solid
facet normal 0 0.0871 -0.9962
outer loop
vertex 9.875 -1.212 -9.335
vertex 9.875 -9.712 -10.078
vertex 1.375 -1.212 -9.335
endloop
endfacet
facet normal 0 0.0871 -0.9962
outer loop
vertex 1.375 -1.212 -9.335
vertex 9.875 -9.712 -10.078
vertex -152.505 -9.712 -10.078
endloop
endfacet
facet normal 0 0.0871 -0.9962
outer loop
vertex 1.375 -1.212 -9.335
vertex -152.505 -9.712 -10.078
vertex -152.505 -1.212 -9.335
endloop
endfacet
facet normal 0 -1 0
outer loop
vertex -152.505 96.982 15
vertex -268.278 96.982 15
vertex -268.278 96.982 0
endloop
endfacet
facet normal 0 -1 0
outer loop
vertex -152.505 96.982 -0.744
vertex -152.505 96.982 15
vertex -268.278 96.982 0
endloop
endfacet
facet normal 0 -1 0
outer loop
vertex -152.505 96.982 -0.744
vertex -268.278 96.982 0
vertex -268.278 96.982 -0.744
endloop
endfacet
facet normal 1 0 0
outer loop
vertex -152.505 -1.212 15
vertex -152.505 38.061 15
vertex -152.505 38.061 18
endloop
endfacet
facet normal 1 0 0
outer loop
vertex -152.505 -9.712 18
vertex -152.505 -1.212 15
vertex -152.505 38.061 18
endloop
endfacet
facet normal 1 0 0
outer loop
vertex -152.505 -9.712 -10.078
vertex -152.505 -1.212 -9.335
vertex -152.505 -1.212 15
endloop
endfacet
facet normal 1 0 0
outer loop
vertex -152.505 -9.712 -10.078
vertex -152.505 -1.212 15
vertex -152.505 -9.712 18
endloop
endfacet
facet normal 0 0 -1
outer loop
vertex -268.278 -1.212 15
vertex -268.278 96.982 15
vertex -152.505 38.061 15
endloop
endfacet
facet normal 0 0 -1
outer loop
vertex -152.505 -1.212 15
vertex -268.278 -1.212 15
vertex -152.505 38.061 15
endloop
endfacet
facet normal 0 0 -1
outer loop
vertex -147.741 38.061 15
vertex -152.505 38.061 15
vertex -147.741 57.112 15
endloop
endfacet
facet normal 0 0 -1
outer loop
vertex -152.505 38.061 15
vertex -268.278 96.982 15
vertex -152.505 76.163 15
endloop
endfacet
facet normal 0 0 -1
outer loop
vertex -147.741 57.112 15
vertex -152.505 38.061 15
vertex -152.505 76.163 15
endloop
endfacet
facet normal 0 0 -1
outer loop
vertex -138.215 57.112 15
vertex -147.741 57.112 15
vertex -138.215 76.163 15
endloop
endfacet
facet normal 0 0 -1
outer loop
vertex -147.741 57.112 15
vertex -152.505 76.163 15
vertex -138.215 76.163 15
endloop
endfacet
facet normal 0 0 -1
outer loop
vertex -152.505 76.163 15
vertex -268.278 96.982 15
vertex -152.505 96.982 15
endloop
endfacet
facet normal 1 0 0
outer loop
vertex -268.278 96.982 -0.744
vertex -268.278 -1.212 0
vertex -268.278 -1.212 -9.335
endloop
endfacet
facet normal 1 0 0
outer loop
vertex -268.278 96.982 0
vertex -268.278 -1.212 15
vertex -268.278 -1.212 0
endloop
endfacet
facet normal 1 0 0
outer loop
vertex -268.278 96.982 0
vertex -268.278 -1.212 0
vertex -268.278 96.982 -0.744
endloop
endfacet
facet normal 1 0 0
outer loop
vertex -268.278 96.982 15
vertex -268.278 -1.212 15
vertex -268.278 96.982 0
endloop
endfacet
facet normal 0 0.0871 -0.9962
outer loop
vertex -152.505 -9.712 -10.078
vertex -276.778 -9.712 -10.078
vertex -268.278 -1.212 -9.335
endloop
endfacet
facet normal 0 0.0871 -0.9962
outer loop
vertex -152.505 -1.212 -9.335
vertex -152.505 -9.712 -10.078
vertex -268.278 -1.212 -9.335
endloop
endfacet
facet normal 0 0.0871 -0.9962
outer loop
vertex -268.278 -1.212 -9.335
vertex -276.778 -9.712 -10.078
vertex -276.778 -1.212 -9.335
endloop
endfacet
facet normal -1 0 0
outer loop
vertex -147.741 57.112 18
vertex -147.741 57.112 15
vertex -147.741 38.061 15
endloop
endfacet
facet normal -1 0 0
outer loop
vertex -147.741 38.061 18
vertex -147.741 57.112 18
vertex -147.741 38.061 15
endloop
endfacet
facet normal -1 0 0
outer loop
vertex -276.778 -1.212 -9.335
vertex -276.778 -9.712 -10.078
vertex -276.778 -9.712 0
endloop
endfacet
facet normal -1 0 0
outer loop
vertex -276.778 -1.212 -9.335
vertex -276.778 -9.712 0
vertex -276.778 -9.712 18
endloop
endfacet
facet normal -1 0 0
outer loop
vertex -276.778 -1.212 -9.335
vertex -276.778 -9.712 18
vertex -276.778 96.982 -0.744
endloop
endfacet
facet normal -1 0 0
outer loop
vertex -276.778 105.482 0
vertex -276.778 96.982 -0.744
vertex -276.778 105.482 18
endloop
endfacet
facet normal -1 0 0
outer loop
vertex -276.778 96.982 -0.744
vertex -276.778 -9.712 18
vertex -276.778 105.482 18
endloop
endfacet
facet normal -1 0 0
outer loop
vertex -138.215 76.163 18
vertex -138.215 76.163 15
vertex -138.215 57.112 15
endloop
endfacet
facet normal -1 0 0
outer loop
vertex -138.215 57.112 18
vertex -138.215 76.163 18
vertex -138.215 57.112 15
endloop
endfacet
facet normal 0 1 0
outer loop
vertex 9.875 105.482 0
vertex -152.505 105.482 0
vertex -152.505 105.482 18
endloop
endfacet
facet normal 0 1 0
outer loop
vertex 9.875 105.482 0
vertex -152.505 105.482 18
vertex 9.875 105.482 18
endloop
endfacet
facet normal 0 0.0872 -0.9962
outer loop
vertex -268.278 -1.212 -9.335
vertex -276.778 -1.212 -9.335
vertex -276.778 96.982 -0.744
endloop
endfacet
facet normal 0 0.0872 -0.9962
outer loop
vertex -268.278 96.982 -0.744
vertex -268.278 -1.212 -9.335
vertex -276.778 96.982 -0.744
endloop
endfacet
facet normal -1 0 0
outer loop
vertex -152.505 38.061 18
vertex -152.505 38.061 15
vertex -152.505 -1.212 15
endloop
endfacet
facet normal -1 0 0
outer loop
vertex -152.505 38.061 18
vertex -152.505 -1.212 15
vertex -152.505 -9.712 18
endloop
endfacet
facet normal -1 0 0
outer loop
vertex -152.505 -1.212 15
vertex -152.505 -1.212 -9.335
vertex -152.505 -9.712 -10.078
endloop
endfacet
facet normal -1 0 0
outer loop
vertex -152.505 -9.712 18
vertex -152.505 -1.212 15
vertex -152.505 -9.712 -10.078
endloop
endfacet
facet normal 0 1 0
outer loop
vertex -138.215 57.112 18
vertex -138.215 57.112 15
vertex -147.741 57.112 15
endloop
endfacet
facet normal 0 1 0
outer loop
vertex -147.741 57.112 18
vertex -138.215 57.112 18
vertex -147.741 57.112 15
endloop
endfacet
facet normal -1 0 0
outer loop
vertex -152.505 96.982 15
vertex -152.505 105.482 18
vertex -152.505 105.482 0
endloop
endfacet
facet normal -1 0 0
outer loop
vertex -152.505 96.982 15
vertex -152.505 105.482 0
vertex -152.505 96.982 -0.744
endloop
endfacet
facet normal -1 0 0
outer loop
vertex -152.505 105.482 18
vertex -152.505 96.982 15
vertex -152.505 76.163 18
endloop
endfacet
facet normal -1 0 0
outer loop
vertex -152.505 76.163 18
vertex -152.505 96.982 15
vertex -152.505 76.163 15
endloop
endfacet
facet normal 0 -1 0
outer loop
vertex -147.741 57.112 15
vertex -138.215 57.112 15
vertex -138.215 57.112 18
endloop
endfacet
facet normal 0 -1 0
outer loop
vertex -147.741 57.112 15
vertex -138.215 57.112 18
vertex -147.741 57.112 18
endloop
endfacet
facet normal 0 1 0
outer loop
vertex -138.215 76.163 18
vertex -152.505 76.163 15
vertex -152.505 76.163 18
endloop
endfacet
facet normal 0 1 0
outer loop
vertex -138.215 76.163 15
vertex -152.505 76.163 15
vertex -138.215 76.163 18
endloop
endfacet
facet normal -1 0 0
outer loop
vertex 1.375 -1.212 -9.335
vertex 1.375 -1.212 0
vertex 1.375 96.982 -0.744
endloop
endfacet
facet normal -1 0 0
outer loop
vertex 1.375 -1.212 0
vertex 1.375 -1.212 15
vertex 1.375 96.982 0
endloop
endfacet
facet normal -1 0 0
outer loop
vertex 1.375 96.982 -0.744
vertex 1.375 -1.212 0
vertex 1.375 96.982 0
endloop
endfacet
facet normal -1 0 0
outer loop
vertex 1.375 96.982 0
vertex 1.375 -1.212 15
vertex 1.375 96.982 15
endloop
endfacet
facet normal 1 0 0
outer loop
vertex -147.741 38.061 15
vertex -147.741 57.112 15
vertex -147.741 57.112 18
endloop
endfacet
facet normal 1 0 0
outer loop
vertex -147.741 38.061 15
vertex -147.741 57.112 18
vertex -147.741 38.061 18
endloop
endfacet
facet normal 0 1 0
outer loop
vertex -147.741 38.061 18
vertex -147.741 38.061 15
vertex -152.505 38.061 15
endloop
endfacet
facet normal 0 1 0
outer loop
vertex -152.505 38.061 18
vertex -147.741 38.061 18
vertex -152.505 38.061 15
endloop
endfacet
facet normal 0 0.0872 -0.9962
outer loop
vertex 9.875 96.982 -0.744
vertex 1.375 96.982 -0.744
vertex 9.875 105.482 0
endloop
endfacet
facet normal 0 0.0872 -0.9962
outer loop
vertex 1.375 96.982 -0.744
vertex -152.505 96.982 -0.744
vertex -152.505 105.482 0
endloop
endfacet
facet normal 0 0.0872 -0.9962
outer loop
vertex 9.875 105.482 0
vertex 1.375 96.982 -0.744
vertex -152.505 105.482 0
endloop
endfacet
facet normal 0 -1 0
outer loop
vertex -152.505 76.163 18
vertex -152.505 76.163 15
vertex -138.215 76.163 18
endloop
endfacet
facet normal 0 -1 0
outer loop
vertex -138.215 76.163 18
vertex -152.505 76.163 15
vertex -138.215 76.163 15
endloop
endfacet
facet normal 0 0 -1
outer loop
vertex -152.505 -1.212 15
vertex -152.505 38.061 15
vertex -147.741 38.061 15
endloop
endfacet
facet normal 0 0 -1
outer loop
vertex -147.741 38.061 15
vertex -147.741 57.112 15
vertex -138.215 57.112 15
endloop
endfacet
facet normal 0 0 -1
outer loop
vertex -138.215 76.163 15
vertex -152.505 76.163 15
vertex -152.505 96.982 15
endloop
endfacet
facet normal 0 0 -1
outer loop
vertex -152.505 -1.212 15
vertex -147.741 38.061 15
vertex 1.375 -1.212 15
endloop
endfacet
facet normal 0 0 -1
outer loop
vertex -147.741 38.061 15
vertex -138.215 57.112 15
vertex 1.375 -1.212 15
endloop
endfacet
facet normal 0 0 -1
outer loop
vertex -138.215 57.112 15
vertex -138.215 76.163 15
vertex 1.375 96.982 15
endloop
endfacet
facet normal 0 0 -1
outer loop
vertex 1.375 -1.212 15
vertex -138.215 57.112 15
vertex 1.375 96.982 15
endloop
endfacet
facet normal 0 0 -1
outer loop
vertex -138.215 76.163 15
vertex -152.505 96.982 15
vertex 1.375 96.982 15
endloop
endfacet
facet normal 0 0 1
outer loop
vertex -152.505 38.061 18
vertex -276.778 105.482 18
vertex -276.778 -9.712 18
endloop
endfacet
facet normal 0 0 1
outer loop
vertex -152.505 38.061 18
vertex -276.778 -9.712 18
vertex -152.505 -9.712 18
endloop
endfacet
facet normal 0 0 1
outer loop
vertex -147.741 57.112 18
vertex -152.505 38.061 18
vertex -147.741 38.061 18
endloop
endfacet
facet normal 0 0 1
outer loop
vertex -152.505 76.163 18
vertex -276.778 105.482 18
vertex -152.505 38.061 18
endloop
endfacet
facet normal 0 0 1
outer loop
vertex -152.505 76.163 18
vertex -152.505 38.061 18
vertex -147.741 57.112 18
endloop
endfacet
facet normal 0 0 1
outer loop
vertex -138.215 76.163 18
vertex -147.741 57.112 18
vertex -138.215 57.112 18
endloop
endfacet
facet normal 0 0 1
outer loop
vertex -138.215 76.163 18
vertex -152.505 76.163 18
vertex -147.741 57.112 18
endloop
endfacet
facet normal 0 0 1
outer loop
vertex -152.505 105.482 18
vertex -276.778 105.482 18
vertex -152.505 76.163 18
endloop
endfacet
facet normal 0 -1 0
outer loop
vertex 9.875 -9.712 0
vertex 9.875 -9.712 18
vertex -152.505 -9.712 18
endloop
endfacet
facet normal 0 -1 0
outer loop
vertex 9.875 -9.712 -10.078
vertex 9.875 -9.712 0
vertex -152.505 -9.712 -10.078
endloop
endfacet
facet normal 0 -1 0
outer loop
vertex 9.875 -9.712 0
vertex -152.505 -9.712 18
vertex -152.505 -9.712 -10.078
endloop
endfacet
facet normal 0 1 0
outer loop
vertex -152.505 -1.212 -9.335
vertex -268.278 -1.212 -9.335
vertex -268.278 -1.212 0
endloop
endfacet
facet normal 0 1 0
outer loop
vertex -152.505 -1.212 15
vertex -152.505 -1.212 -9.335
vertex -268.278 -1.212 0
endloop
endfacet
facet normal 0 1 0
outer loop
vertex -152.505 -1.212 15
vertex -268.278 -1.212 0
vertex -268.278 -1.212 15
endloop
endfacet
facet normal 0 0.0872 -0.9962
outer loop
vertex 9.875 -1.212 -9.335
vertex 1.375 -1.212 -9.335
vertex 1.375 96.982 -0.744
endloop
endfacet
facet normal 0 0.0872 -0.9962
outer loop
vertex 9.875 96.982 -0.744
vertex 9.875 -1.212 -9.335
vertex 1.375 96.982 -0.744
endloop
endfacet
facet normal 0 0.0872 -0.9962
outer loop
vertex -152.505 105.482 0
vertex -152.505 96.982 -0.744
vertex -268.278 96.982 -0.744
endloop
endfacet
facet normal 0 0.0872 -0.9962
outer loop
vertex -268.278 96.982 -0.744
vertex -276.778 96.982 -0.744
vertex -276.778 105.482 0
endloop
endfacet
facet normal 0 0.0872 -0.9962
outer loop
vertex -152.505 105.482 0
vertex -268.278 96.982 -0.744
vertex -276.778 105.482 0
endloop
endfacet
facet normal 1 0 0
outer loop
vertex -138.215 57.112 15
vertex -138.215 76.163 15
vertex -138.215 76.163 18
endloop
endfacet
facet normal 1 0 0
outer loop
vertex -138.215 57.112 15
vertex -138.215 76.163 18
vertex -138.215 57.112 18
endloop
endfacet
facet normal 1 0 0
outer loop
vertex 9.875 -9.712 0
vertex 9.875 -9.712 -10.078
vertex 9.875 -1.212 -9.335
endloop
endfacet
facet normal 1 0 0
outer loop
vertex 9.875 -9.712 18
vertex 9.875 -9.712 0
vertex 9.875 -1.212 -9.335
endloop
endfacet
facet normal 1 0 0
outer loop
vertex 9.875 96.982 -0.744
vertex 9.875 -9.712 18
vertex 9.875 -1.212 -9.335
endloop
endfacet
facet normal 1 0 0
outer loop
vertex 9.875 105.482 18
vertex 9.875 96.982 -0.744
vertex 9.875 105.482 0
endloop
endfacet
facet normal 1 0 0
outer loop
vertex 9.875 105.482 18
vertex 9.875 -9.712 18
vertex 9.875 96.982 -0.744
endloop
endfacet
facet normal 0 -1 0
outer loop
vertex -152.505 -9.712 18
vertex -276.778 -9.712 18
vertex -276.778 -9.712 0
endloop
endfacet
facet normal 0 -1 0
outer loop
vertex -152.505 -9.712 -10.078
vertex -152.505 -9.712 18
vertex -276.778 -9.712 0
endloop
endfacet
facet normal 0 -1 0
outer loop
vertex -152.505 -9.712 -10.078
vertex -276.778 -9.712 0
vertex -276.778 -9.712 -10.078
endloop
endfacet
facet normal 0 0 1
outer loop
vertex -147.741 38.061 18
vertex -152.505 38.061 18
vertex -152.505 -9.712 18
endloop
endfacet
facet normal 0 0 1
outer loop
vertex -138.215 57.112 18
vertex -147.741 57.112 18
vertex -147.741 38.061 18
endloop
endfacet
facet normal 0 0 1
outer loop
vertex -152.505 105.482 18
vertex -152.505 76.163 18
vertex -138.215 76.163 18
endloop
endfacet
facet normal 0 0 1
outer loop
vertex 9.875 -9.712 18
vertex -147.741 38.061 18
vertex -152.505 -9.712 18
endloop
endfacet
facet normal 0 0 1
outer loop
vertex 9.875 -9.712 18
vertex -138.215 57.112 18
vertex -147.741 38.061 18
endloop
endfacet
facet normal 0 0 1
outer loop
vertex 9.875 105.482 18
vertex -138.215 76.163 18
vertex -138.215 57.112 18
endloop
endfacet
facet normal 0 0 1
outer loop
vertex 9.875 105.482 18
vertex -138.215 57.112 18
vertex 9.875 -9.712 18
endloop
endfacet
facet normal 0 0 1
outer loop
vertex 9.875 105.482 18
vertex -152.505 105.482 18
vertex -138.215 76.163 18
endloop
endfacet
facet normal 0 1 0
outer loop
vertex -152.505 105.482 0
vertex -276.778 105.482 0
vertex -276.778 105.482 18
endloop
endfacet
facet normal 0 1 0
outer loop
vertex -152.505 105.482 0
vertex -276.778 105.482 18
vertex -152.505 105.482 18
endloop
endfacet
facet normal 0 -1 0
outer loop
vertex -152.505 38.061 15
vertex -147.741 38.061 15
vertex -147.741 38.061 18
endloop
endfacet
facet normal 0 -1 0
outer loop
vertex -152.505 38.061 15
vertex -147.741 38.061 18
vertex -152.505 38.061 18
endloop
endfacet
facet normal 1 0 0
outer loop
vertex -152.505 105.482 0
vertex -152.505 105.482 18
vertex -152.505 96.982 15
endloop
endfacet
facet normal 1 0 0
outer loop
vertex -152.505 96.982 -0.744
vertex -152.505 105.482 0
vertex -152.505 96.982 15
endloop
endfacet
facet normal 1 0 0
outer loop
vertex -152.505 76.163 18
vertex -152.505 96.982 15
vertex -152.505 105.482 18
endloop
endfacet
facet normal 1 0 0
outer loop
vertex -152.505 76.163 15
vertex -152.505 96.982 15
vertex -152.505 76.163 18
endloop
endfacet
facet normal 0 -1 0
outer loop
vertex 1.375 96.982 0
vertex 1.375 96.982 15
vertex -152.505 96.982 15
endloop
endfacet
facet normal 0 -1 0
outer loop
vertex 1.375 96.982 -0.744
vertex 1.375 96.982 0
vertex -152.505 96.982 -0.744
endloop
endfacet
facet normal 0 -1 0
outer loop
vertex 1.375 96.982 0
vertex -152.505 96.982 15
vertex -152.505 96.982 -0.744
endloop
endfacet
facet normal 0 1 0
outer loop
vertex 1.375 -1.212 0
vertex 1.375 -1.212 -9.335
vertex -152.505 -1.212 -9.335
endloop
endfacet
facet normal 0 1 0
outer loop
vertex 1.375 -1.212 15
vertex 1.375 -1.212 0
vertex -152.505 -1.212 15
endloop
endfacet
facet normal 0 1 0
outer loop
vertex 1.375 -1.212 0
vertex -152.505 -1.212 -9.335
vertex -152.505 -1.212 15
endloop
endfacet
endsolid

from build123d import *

# Parameters (mm, degrees)
SKETCH1_W              = 286.653251063
SKETCH1_H              = 115.194569729
SKETCH1_W_2            = 269.653251063
SKETCH1_H_2            = 98.194569729
BOSS_EXTRUDE1_DEPTH    = 15
SKETCH2_W              = 286.653251063
SKETCH2_H              = 115.194569729
BOSS_EXTRUDE2_DEPTH    = 3
BOSS_EXTRUDE5_START    = -276.778340417
BOSS_EXTRUDE5_DEPTH    = 286.653251063
BOSS_EXTRUDE5_2_DEPTH  = 8.5
BOSS_EXTRUDE5_START_2  = 1.374910646
BOSS_EXTRUDE5_3_DEPTH  = 8.5
SPLIT1_SURFACE_1_BACK  = 311.207
SPLIT1_SURFACE_1_DEPTH = 622.414
SPLIT1_SURFACE_2_BACK  = 311.207
SPLIT1_SURFACE_2_DEPTH = 622.414


# Read off the part's stored shape, not the designer's step: Boss-Extrude5
with BuildPart() as part:
    # Sketch1 → Boss-Extrude1 (new body)
    with BuildSketch(Plane.XY):
        with Locations((-133.451714886, 47.884990749)):
            Rectangle(SKETCH1_W, SKETCH1_H)
        with Locations((-133.451714886, 47.884990749)):
            Rectangle(SKETCH1_W_2, SKETCH1_H_2, mode=Mode.SUBTRACT)
    extrude(amount=BOSS_EXTRUDE1_DEPTH)

    # Sketch2 → Boss-Extrude2 (add)
    with BuildSketch(Plane.XY.offset(15)):
        with Locations((-133.451714886, 47.884990749)):
            Rectangle(SKETCH2_W, SKETCH2_H)
    extrude(amount=BOSS_EXTRUDE2_DEPTH)

    # Boss-Extrude5 outline → Boss-Extrude5 (add)
    with BuildSketch(Plane.YZ.offset(BOSS_EXTRUDE5_START)):
        Polygon((-9.712294115, 0), (-9.712294115, -10.078218951), (-1.212294115, -9.334565311), (-1.212294115, 0), align=None)
        Polygon((96.982275614, 0), (96.982275614, -0.74365364), (105.482275614, 0), align=None)
    extrude(amount=BOSS_EXTRUDE5_DEPTH)

    # Boss-Extrude5 2 outline → Boss-Extrude5 2 (add)
    with BuildSketch(Plane.YZ.offset(BOSS_EXTRUDE5_START)):
        Polygon((-1.212294115, 0), (-1.212294115, -9.334565311), (96.982275614, -0.74365364), (96.982275614, 0), align=None)
    extrude(amount=BOSS_EXTRUDE5_2_DEPTH)

    # Boss-Extrude5 3 outline → Boss-Extrude5 3 (add)
    with BuildSketch(Plane.YZ.offset(BOSS_EXTRUDE5_START_2)):
        Polygon((-1.212294115, 0), (-1.212294115, -9.334565311), (96.982275614, -0.74365364), (96.982275614, 0), align=None)
    extrude(amount=BOSS_EXTRUDE5_3_DEPTH)


with BuildPart() as body_2:
    # Split1: the piece behind the surface
    add(part.part)
    # Split1 surface: a surface, the sketch's curves swept straight by 622.414 mm
    with BuildLine(Plane.XY.offset(18).offset(-SPLIT1_SURFACE_1_BACK), mode=Mode.PRIVATE) as split1_surface_1_path:
        Line((-152.504909845, 105.482275614), (-152.504909845, 76.162844284))
        Line((-152.504909845, 76.162844284), (-138.215345367, 76.162844284))
        Line((-138.215345367, 76.162844284), (-138.215345367, 57.111891736))
        Line((-138.215345367, 57.111891736), (-147.740821641, 57.111891736))
        Line((-147.740821641, 57.111891736), (-147.740821641, 38.060839184))
        Line((-147.740821641, 38.060839184), (-152.504909845, 38.060839184))
        Line((-152.504909845, 38.060839184), (-152.504909845, -9.712294115))
        Line((-152.504909845, -9.712294115), (-276.778340417, -9.712294115))
        Line((-276.778340417, -9.712294115), (-276.778340417, 105.482275614))
        Line((-276.778340417, 105.482275614), (-152.504909845, 105.482275614))
    split1_surface_1 = Shell.extrude(split1_surface_1_path.wire(), (0 * SPLIT1_SURFACE_1_DEPTH, 0 * SPLIT1_SURFACE_1_DEPTH, 1 * SPLIT1_SURFACE_1_DEPTH))
    split(bisect_by=split1_surface_1, keep=Keep.BOTTOM)


with BuildPart() as part_1:
    add(part.part)

    # Split1: split by a surface, the side it looks to stays
    # Split1 surface: a surface, the sketch's curves swept straight by 622.414 mm
    with BuildLine(Plane.XY.offset(18).offset(-SPLIT1_SURFACE_2_BACK), mode=Mode.PRIVATE) as split1_surface_2_path:
        Line((-152.504909845, 105.482275614), (-152.504909845, 76.162844284))
        Line((-152.504909845, 76.162844284), (-138.215345367, 76.162844284))
        Line((-138.215345367, 76.162844284), (-138.215345367, 57.111891736))
        Line((-138.215345367, 57.111891736), (-147.740821641, 57.111891736))
        Line((-147.740821641, 57.111891736), (-147.740821641, 38.060839184))
        Line((-147.740821641, 38.060839184), (-152.504909845, 38.060839184))
        Line((-152.504909845, 38.060839184), (-152.504909845, -9.712294115))
        Line((-152.504909845, -9.712294115), (-276.778340417, -9.712294115))
        Line((-276.778340417, -9.712294115), (-276.778340417, 105.482275614))
        Line((-276.778340417, 105.482275614), (-152.504909845, 105.482275614))
    split1_surface_2 = Shell.extrude(split1_surface_2_path.wire(), (0 * SPLIT1_SURFACE_2_DEPTH, 0 * SPLIT1_SURFACE_2_DEPTH, 1 * SPLIT1_SURFACE_2_DEPTH))
    split(bisect_by=split1_surface_2, keep=Keep.TOP)


solid = Compound([body_2.part, part_1.part])
